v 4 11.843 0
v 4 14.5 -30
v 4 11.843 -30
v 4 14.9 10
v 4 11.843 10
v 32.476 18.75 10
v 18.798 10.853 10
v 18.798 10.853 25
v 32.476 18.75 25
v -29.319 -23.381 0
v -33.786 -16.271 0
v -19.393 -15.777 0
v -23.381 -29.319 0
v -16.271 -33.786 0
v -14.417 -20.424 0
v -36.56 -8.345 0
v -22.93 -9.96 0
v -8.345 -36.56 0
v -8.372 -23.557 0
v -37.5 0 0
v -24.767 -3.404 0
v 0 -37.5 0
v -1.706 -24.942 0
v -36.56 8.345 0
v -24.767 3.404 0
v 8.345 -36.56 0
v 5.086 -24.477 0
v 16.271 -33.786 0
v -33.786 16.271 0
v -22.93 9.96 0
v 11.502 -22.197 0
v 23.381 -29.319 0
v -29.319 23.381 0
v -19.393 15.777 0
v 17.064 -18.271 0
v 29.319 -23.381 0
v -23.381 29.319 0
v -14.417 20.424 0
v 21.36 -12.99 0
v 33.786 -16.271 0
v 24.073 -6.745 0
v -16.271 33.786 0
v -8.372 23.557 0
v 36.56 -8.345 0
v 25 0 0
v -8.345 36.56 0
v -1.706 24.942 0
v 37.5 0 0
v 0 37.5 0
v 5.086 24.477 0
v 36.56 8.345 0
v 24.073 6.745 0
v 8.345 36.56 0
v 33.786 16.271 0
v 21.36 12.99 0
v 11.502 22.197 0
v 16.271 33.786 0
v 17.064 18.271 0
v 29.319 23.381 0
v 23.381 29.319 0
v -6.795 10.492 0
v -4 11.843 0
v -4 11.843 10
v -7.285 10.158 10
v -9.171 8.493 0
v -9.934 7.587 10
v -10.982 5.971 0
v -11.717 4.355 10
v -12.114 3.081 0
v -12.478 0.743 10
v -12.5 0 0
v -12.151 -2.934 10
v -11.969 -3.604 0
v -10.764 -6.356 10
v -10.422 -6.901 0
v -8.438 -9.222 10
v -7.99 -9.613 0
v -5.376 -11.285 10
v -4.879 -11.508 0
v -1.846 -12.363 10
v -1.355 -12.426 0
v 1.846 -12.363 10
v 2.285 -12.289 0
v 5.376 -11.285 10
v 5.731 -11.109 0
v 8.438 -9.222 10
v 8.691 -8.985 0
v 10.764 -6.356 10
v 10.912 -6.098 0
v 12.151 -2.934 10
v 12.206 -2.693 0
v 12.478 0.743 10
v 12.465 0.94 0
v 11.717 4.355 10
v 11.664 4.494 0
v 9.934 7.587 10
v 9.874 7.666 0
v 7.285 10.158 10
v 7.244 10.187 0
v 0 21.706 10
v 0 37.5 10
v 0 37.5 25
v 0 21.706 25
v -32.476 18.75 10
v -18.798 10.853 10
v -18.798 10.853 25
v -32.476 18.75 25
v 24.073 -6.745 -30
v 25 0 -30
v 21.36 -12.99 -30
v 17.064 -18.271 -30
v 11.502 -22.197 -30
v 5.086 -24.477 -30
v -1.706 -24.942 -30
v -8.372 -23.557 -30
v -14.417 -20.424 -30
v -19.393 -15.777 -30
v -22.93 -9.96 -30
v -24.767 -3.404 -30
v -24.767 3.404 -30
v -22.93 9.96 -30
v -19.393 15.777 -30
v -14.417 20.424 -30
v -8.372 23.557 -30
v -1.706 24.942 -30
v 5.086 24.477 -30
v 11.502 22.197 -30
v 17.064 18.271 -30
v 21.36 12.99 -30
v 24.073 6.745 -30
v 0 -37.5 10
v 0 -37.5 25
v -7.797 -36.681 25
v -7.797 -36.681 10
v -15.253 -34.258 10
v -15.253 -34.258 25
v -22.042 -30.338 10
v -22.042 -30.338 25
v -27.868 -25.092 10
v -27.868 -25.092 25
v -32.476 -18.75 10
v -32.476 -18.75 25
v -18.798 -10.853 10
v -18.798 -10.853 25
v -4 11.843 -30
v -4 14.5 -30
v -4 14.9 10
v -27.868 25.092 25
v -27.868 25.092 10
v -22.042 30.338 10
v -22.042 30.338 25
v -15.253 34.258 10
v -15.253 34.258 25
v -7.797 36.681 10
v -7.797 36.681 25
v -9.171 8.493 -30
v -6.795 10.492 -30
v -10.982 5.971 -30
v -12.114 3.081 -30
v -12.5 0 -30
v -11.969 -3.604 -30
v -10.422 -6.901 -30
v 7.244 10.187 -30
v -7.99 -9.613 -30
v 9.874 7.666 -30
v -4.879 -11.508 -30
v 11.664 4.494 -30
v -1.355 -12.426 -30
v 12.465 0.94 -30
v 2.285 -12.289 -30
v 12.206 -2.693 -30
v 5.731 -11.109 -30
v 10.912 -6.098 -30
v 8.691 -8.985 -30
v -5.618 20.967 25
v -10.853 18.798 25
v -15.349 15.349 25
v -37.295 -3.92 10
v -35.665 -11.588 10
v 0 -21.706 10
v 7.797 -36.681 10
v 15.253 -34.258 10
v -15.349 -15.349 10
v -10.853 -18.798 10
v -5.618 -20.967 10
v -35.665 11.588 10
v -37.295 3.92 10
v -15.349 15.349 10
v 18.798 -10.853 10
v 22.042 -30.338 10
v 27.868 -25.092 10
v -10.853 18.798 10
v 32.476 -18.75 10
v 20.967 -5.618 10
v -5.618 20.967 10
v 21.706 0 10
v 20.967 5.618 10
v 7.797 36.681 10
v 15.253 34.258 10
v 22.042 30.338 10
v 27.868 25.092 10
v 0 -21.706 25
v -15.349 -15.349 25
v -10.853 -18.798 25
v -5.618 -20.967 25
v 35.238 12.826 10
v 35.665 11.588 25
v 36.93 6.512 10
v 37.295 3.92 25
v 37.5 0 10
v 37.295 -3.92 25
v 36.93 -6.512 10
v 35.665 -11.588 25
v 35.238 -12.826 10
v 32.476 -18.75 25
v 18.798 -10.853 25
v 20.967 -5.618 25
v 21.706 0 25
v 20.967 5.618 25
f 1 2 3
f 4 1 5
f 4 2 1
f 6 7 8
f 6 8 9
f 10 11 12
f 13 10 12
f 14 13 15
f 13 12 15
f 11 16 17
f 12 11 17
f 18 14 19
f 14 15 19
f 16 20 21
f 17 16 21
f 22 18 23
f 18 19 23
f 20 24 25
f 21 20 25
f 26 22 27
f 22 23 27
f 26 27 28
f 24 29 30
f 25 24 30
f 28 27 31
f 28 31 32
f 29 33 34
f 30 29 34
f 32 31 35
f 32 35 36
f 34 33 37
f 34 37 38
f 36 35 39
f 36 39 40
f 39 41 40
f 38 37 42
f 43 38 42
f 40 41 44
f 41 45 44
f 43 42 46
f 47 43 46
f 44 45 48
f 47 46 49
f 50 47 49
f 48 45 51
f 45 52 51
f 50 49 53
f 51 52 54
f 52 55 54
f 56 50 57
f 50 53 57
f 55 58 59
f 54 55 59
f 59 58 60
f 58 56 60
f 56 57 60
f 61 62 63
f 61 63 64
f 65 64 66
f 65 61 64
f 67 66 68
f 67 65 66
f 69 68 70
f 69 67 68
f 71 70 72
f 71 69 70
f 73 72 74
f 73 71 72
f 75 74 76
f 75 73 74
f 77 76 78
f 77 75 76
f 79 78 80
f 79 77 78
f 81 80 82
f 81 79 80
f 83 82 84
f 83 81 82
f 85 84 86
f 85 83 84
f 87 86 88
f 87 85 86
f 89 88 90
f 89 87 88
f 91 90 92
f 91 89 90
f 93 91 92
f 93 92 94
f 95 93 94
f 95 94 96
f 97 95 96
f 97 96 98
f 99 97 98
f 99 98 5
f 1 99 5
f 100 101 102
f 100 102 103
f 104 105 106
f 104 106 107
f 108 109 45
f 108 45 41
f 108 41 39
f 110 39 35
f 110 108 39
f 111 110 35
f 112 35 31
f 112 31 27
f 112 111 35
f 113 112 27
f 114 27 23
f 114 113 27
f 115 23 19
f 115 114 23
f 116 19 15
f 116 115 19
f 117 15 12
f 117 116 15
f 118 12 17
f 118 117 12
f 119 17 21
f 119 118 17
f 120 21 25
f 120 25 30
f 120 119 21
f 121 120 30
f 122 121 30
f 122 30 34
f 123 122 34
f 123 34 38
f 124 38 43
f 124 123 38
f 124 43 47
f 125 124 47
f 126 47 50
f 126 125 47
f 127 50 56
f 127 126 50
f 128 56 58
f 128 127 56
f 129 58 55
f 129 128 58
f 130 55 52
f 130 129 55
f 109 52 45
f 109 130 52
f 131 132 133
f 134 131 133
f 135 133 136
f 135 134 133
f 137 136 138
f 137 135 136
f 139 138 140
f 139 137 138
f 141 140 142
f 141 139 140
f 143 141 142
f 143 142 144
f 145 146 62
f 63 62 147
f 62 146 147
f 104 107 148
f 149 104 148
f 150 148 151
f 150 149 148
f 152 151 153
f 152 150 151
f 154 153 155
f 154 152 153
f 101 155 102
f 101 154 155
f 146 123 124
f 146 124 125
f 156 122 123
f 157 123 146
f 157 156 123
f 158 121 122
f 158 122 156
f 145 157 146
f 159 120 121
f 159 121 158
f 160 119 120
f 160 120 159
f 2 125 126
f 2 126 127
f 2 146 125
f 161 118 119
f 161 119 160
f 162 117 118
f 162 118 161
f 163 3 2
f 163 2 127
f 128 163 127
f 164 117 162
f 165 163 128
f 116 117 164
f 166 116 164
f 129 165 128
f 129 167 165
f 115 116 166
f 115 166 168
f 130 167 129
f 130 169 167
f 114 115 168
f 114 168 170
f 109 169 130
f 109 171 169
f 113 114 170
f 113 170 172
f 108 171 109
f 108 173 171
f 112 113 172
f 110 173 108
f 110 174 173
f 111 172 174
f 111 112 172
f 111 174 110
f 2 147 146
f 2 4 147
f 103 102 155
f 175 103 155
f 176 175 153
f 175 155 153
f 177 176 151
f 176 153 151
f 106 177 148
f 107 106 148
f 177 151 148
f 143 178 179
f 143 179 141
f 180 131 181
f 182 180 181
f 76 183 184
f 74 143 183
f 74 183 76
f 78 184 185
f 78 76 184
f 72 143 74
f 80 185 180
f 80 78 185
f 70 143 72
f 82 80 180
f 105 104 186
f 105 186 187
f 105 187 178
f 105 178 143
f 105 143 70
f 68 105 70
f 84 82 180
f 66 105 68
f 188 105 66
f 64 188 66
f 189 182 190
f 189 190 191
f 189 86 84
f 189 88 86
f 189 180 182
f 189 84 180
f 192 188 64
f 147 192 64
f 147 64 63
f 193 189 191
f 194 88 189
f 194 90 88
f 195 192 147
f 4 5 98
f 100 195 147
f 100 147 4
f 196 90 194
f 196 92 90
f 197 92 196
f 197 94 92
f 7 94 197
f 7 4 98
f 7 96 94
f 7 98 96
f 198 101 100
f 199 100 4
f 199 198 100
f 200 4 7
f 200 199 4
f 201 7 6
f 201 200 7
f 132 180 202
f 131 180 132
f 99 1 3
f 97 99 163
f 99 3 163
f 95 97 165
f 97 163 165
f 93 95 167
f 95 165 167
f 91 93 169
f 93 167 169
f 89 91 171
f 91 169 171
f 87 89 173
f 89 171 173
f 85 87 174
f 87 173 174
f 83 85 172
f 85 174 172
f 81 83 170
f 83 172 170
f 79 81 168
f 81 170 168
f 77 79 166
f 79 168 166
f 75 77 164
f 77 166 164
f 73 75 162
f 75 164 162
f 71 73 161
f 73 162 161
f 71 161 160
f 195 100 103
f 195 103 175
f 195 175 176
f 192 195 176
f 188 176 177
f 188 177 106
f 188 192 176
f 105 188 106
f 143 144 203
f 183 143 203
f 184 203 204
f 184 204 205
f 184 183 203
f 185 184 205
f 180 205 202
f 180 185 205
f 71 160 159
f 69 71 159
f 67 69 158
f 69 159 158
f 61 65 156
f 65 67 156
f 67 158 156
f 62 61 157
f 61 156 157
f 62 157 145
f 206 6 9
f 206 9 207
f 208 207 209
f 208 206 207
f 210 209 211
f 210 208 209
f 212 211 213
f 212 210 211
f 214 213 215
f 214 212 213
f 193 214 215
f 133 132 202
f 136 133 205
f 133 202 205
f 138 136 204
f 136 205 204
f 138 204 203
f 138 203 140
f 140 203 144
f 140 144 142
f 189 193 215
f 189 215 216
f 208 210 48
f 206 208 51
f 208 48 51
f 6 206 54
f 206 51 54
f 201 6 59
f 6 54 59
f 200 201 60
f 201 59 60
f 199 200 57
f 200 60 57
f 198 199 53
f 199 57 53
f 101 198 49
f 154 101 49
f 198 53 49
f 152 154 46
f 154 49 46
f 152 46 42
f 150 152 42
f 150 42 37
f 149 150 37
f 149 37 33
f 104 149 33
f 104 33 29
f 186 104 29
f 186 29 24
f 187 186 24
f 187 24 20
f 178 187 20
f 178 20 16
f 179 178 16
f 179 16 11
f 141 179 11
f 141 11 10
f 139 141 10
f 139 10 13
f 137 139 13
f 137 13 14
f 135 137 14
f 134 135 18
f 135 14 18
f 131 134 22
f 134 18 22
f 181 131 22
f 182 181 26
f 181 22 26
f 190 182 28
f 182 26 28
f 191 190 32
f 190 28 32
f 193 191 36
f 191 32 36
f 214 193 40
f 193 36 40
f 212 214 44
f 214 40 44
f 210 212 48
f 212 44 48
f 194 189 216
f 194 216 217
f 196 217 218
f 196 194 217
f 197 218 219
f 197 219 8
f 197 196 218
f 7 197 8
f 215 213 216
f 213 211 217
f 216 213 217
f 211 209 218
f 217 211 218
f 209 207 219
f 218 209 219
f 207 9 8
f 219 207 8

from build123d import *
from build123d.topology import SkipClean

# Parameters (mm, degrees)
SKETCH1_R           = 37.5
BOSS_EXTRUDE1_DEPTH = 10
BOSS_EXTRUDE2_DEPTH = 15
BOSS_EXTRUDE3_START = 30
SKETCH5_R           = 25
SKETCH5_R_2         = 12.5
BOSS_EXTRUDE3_DEPTH = 30
CUT_EXTRUDE1_DEPTH  = 4


with BuildPart() as part:
    # Sketch1 → Boss-Extrude1 (new body)
    with BuildSketch(Plane.XY):
        Circle(SKETCH1_R)
        with BuildLine():
            ThreePointArc((-4, 11.842719282), (0, -12.5), (4, 11.842719282))
            ThreePointArc((4, 11.842719282), (0, 12.5), (-4, 11.842719282))
        make_face(mode=Mode.SUBTRACT)
    extrude(amount=BOSS_EXTRUDE1_DEPTH)

    # Sketch3 → Boss-Extrude2 (add)
    with SkipClean():  # the faces are left unmerged after this step: merging them gives an invalid solid
        with BuildSketch(Plane.XY.offset(10)):
            with BuildLine():
                Line((-32.475952642, -18.75), (-18.798362826, -10.853239838))
                ThreePointArc((-18.798362826, -10.853239838), (-10.853239838, -18.798362826), (0, -21.706479676))
                Line((0, -21.706479676), (0, -37.5))
                ThreePointArc((0, -37.5), (-18.75, -32.475952642), (-32.475952642, -18.75))
            make_face()
            with BuildLine():
                Line((0, 37.5), (0, 21.706479676))
                ThreePointArc((0, 21.706479676), (-10.853239838, 18.798362826), (-18.798362826, 10.853239838))
                Line((-18.798362826, 10.853239838), (-32.475952642, 18.75))
                ThreePointArc((-32.475952642, 18.75), (-18.75, 32.475952642), (0, 37.5))
            make_face()
            with BuildLine():
                Line((32.475952642, -18.75), (18.798362826, -10.853239838))
                ThreePointArc((18.798362826, -10.853239838), (21.706479676, 0), (18.798362826, 10.853239838))
                Line((18.798362826, 10.853239838), (32.475952642, 18.75))
                ThreePointArc((32.475952642, 18.75), (37.5, 0), (32.475952642, -18.75))
            make_face()
        extrude(amount=BOSS_EXTRUDE2_DEPTH)

    # Sketch5 → Boss-Extrude3 (add)
    with SkipClean():  # the faces are left unmerged after this step: merging them gives an invalid solid
        with BuildSketch(Plane(origin=(0, 0, 0), x_dir=(-1, 0, 0), z_dir=(0, 0, -1)).offset(BOSS_EXTRUDE3_START)):
            with Locations(Location((0, 0, 0), (0, 0, 180))):
                Circle(SKETCH5_R)
            Circle(SKETCH5_R_2, mode=Mode.SUBTRACT)
        extrude(amount=-BOSS_EXTRUDE3_DEPTH)

    # Sketch7 → Cut-Extrude1 (cut, symmetric)
    with SkipClean():  # the faces are left unmerged after this step: merging them gives an invalid solid
        with BuildSketch(Plane(origin=(0, 0, 0), x_dir=(0, 0, -1), z_dir=(1, 0, 0))):
            Polygon((30, 0), (-10, 0), (-10, 14.9), (30, 14.5), align=None)
        extrude(amount=CUT_EXTRUDE1_DEPTH, both=True, mode=Mode.SUBTRACT)


solid = part.part
